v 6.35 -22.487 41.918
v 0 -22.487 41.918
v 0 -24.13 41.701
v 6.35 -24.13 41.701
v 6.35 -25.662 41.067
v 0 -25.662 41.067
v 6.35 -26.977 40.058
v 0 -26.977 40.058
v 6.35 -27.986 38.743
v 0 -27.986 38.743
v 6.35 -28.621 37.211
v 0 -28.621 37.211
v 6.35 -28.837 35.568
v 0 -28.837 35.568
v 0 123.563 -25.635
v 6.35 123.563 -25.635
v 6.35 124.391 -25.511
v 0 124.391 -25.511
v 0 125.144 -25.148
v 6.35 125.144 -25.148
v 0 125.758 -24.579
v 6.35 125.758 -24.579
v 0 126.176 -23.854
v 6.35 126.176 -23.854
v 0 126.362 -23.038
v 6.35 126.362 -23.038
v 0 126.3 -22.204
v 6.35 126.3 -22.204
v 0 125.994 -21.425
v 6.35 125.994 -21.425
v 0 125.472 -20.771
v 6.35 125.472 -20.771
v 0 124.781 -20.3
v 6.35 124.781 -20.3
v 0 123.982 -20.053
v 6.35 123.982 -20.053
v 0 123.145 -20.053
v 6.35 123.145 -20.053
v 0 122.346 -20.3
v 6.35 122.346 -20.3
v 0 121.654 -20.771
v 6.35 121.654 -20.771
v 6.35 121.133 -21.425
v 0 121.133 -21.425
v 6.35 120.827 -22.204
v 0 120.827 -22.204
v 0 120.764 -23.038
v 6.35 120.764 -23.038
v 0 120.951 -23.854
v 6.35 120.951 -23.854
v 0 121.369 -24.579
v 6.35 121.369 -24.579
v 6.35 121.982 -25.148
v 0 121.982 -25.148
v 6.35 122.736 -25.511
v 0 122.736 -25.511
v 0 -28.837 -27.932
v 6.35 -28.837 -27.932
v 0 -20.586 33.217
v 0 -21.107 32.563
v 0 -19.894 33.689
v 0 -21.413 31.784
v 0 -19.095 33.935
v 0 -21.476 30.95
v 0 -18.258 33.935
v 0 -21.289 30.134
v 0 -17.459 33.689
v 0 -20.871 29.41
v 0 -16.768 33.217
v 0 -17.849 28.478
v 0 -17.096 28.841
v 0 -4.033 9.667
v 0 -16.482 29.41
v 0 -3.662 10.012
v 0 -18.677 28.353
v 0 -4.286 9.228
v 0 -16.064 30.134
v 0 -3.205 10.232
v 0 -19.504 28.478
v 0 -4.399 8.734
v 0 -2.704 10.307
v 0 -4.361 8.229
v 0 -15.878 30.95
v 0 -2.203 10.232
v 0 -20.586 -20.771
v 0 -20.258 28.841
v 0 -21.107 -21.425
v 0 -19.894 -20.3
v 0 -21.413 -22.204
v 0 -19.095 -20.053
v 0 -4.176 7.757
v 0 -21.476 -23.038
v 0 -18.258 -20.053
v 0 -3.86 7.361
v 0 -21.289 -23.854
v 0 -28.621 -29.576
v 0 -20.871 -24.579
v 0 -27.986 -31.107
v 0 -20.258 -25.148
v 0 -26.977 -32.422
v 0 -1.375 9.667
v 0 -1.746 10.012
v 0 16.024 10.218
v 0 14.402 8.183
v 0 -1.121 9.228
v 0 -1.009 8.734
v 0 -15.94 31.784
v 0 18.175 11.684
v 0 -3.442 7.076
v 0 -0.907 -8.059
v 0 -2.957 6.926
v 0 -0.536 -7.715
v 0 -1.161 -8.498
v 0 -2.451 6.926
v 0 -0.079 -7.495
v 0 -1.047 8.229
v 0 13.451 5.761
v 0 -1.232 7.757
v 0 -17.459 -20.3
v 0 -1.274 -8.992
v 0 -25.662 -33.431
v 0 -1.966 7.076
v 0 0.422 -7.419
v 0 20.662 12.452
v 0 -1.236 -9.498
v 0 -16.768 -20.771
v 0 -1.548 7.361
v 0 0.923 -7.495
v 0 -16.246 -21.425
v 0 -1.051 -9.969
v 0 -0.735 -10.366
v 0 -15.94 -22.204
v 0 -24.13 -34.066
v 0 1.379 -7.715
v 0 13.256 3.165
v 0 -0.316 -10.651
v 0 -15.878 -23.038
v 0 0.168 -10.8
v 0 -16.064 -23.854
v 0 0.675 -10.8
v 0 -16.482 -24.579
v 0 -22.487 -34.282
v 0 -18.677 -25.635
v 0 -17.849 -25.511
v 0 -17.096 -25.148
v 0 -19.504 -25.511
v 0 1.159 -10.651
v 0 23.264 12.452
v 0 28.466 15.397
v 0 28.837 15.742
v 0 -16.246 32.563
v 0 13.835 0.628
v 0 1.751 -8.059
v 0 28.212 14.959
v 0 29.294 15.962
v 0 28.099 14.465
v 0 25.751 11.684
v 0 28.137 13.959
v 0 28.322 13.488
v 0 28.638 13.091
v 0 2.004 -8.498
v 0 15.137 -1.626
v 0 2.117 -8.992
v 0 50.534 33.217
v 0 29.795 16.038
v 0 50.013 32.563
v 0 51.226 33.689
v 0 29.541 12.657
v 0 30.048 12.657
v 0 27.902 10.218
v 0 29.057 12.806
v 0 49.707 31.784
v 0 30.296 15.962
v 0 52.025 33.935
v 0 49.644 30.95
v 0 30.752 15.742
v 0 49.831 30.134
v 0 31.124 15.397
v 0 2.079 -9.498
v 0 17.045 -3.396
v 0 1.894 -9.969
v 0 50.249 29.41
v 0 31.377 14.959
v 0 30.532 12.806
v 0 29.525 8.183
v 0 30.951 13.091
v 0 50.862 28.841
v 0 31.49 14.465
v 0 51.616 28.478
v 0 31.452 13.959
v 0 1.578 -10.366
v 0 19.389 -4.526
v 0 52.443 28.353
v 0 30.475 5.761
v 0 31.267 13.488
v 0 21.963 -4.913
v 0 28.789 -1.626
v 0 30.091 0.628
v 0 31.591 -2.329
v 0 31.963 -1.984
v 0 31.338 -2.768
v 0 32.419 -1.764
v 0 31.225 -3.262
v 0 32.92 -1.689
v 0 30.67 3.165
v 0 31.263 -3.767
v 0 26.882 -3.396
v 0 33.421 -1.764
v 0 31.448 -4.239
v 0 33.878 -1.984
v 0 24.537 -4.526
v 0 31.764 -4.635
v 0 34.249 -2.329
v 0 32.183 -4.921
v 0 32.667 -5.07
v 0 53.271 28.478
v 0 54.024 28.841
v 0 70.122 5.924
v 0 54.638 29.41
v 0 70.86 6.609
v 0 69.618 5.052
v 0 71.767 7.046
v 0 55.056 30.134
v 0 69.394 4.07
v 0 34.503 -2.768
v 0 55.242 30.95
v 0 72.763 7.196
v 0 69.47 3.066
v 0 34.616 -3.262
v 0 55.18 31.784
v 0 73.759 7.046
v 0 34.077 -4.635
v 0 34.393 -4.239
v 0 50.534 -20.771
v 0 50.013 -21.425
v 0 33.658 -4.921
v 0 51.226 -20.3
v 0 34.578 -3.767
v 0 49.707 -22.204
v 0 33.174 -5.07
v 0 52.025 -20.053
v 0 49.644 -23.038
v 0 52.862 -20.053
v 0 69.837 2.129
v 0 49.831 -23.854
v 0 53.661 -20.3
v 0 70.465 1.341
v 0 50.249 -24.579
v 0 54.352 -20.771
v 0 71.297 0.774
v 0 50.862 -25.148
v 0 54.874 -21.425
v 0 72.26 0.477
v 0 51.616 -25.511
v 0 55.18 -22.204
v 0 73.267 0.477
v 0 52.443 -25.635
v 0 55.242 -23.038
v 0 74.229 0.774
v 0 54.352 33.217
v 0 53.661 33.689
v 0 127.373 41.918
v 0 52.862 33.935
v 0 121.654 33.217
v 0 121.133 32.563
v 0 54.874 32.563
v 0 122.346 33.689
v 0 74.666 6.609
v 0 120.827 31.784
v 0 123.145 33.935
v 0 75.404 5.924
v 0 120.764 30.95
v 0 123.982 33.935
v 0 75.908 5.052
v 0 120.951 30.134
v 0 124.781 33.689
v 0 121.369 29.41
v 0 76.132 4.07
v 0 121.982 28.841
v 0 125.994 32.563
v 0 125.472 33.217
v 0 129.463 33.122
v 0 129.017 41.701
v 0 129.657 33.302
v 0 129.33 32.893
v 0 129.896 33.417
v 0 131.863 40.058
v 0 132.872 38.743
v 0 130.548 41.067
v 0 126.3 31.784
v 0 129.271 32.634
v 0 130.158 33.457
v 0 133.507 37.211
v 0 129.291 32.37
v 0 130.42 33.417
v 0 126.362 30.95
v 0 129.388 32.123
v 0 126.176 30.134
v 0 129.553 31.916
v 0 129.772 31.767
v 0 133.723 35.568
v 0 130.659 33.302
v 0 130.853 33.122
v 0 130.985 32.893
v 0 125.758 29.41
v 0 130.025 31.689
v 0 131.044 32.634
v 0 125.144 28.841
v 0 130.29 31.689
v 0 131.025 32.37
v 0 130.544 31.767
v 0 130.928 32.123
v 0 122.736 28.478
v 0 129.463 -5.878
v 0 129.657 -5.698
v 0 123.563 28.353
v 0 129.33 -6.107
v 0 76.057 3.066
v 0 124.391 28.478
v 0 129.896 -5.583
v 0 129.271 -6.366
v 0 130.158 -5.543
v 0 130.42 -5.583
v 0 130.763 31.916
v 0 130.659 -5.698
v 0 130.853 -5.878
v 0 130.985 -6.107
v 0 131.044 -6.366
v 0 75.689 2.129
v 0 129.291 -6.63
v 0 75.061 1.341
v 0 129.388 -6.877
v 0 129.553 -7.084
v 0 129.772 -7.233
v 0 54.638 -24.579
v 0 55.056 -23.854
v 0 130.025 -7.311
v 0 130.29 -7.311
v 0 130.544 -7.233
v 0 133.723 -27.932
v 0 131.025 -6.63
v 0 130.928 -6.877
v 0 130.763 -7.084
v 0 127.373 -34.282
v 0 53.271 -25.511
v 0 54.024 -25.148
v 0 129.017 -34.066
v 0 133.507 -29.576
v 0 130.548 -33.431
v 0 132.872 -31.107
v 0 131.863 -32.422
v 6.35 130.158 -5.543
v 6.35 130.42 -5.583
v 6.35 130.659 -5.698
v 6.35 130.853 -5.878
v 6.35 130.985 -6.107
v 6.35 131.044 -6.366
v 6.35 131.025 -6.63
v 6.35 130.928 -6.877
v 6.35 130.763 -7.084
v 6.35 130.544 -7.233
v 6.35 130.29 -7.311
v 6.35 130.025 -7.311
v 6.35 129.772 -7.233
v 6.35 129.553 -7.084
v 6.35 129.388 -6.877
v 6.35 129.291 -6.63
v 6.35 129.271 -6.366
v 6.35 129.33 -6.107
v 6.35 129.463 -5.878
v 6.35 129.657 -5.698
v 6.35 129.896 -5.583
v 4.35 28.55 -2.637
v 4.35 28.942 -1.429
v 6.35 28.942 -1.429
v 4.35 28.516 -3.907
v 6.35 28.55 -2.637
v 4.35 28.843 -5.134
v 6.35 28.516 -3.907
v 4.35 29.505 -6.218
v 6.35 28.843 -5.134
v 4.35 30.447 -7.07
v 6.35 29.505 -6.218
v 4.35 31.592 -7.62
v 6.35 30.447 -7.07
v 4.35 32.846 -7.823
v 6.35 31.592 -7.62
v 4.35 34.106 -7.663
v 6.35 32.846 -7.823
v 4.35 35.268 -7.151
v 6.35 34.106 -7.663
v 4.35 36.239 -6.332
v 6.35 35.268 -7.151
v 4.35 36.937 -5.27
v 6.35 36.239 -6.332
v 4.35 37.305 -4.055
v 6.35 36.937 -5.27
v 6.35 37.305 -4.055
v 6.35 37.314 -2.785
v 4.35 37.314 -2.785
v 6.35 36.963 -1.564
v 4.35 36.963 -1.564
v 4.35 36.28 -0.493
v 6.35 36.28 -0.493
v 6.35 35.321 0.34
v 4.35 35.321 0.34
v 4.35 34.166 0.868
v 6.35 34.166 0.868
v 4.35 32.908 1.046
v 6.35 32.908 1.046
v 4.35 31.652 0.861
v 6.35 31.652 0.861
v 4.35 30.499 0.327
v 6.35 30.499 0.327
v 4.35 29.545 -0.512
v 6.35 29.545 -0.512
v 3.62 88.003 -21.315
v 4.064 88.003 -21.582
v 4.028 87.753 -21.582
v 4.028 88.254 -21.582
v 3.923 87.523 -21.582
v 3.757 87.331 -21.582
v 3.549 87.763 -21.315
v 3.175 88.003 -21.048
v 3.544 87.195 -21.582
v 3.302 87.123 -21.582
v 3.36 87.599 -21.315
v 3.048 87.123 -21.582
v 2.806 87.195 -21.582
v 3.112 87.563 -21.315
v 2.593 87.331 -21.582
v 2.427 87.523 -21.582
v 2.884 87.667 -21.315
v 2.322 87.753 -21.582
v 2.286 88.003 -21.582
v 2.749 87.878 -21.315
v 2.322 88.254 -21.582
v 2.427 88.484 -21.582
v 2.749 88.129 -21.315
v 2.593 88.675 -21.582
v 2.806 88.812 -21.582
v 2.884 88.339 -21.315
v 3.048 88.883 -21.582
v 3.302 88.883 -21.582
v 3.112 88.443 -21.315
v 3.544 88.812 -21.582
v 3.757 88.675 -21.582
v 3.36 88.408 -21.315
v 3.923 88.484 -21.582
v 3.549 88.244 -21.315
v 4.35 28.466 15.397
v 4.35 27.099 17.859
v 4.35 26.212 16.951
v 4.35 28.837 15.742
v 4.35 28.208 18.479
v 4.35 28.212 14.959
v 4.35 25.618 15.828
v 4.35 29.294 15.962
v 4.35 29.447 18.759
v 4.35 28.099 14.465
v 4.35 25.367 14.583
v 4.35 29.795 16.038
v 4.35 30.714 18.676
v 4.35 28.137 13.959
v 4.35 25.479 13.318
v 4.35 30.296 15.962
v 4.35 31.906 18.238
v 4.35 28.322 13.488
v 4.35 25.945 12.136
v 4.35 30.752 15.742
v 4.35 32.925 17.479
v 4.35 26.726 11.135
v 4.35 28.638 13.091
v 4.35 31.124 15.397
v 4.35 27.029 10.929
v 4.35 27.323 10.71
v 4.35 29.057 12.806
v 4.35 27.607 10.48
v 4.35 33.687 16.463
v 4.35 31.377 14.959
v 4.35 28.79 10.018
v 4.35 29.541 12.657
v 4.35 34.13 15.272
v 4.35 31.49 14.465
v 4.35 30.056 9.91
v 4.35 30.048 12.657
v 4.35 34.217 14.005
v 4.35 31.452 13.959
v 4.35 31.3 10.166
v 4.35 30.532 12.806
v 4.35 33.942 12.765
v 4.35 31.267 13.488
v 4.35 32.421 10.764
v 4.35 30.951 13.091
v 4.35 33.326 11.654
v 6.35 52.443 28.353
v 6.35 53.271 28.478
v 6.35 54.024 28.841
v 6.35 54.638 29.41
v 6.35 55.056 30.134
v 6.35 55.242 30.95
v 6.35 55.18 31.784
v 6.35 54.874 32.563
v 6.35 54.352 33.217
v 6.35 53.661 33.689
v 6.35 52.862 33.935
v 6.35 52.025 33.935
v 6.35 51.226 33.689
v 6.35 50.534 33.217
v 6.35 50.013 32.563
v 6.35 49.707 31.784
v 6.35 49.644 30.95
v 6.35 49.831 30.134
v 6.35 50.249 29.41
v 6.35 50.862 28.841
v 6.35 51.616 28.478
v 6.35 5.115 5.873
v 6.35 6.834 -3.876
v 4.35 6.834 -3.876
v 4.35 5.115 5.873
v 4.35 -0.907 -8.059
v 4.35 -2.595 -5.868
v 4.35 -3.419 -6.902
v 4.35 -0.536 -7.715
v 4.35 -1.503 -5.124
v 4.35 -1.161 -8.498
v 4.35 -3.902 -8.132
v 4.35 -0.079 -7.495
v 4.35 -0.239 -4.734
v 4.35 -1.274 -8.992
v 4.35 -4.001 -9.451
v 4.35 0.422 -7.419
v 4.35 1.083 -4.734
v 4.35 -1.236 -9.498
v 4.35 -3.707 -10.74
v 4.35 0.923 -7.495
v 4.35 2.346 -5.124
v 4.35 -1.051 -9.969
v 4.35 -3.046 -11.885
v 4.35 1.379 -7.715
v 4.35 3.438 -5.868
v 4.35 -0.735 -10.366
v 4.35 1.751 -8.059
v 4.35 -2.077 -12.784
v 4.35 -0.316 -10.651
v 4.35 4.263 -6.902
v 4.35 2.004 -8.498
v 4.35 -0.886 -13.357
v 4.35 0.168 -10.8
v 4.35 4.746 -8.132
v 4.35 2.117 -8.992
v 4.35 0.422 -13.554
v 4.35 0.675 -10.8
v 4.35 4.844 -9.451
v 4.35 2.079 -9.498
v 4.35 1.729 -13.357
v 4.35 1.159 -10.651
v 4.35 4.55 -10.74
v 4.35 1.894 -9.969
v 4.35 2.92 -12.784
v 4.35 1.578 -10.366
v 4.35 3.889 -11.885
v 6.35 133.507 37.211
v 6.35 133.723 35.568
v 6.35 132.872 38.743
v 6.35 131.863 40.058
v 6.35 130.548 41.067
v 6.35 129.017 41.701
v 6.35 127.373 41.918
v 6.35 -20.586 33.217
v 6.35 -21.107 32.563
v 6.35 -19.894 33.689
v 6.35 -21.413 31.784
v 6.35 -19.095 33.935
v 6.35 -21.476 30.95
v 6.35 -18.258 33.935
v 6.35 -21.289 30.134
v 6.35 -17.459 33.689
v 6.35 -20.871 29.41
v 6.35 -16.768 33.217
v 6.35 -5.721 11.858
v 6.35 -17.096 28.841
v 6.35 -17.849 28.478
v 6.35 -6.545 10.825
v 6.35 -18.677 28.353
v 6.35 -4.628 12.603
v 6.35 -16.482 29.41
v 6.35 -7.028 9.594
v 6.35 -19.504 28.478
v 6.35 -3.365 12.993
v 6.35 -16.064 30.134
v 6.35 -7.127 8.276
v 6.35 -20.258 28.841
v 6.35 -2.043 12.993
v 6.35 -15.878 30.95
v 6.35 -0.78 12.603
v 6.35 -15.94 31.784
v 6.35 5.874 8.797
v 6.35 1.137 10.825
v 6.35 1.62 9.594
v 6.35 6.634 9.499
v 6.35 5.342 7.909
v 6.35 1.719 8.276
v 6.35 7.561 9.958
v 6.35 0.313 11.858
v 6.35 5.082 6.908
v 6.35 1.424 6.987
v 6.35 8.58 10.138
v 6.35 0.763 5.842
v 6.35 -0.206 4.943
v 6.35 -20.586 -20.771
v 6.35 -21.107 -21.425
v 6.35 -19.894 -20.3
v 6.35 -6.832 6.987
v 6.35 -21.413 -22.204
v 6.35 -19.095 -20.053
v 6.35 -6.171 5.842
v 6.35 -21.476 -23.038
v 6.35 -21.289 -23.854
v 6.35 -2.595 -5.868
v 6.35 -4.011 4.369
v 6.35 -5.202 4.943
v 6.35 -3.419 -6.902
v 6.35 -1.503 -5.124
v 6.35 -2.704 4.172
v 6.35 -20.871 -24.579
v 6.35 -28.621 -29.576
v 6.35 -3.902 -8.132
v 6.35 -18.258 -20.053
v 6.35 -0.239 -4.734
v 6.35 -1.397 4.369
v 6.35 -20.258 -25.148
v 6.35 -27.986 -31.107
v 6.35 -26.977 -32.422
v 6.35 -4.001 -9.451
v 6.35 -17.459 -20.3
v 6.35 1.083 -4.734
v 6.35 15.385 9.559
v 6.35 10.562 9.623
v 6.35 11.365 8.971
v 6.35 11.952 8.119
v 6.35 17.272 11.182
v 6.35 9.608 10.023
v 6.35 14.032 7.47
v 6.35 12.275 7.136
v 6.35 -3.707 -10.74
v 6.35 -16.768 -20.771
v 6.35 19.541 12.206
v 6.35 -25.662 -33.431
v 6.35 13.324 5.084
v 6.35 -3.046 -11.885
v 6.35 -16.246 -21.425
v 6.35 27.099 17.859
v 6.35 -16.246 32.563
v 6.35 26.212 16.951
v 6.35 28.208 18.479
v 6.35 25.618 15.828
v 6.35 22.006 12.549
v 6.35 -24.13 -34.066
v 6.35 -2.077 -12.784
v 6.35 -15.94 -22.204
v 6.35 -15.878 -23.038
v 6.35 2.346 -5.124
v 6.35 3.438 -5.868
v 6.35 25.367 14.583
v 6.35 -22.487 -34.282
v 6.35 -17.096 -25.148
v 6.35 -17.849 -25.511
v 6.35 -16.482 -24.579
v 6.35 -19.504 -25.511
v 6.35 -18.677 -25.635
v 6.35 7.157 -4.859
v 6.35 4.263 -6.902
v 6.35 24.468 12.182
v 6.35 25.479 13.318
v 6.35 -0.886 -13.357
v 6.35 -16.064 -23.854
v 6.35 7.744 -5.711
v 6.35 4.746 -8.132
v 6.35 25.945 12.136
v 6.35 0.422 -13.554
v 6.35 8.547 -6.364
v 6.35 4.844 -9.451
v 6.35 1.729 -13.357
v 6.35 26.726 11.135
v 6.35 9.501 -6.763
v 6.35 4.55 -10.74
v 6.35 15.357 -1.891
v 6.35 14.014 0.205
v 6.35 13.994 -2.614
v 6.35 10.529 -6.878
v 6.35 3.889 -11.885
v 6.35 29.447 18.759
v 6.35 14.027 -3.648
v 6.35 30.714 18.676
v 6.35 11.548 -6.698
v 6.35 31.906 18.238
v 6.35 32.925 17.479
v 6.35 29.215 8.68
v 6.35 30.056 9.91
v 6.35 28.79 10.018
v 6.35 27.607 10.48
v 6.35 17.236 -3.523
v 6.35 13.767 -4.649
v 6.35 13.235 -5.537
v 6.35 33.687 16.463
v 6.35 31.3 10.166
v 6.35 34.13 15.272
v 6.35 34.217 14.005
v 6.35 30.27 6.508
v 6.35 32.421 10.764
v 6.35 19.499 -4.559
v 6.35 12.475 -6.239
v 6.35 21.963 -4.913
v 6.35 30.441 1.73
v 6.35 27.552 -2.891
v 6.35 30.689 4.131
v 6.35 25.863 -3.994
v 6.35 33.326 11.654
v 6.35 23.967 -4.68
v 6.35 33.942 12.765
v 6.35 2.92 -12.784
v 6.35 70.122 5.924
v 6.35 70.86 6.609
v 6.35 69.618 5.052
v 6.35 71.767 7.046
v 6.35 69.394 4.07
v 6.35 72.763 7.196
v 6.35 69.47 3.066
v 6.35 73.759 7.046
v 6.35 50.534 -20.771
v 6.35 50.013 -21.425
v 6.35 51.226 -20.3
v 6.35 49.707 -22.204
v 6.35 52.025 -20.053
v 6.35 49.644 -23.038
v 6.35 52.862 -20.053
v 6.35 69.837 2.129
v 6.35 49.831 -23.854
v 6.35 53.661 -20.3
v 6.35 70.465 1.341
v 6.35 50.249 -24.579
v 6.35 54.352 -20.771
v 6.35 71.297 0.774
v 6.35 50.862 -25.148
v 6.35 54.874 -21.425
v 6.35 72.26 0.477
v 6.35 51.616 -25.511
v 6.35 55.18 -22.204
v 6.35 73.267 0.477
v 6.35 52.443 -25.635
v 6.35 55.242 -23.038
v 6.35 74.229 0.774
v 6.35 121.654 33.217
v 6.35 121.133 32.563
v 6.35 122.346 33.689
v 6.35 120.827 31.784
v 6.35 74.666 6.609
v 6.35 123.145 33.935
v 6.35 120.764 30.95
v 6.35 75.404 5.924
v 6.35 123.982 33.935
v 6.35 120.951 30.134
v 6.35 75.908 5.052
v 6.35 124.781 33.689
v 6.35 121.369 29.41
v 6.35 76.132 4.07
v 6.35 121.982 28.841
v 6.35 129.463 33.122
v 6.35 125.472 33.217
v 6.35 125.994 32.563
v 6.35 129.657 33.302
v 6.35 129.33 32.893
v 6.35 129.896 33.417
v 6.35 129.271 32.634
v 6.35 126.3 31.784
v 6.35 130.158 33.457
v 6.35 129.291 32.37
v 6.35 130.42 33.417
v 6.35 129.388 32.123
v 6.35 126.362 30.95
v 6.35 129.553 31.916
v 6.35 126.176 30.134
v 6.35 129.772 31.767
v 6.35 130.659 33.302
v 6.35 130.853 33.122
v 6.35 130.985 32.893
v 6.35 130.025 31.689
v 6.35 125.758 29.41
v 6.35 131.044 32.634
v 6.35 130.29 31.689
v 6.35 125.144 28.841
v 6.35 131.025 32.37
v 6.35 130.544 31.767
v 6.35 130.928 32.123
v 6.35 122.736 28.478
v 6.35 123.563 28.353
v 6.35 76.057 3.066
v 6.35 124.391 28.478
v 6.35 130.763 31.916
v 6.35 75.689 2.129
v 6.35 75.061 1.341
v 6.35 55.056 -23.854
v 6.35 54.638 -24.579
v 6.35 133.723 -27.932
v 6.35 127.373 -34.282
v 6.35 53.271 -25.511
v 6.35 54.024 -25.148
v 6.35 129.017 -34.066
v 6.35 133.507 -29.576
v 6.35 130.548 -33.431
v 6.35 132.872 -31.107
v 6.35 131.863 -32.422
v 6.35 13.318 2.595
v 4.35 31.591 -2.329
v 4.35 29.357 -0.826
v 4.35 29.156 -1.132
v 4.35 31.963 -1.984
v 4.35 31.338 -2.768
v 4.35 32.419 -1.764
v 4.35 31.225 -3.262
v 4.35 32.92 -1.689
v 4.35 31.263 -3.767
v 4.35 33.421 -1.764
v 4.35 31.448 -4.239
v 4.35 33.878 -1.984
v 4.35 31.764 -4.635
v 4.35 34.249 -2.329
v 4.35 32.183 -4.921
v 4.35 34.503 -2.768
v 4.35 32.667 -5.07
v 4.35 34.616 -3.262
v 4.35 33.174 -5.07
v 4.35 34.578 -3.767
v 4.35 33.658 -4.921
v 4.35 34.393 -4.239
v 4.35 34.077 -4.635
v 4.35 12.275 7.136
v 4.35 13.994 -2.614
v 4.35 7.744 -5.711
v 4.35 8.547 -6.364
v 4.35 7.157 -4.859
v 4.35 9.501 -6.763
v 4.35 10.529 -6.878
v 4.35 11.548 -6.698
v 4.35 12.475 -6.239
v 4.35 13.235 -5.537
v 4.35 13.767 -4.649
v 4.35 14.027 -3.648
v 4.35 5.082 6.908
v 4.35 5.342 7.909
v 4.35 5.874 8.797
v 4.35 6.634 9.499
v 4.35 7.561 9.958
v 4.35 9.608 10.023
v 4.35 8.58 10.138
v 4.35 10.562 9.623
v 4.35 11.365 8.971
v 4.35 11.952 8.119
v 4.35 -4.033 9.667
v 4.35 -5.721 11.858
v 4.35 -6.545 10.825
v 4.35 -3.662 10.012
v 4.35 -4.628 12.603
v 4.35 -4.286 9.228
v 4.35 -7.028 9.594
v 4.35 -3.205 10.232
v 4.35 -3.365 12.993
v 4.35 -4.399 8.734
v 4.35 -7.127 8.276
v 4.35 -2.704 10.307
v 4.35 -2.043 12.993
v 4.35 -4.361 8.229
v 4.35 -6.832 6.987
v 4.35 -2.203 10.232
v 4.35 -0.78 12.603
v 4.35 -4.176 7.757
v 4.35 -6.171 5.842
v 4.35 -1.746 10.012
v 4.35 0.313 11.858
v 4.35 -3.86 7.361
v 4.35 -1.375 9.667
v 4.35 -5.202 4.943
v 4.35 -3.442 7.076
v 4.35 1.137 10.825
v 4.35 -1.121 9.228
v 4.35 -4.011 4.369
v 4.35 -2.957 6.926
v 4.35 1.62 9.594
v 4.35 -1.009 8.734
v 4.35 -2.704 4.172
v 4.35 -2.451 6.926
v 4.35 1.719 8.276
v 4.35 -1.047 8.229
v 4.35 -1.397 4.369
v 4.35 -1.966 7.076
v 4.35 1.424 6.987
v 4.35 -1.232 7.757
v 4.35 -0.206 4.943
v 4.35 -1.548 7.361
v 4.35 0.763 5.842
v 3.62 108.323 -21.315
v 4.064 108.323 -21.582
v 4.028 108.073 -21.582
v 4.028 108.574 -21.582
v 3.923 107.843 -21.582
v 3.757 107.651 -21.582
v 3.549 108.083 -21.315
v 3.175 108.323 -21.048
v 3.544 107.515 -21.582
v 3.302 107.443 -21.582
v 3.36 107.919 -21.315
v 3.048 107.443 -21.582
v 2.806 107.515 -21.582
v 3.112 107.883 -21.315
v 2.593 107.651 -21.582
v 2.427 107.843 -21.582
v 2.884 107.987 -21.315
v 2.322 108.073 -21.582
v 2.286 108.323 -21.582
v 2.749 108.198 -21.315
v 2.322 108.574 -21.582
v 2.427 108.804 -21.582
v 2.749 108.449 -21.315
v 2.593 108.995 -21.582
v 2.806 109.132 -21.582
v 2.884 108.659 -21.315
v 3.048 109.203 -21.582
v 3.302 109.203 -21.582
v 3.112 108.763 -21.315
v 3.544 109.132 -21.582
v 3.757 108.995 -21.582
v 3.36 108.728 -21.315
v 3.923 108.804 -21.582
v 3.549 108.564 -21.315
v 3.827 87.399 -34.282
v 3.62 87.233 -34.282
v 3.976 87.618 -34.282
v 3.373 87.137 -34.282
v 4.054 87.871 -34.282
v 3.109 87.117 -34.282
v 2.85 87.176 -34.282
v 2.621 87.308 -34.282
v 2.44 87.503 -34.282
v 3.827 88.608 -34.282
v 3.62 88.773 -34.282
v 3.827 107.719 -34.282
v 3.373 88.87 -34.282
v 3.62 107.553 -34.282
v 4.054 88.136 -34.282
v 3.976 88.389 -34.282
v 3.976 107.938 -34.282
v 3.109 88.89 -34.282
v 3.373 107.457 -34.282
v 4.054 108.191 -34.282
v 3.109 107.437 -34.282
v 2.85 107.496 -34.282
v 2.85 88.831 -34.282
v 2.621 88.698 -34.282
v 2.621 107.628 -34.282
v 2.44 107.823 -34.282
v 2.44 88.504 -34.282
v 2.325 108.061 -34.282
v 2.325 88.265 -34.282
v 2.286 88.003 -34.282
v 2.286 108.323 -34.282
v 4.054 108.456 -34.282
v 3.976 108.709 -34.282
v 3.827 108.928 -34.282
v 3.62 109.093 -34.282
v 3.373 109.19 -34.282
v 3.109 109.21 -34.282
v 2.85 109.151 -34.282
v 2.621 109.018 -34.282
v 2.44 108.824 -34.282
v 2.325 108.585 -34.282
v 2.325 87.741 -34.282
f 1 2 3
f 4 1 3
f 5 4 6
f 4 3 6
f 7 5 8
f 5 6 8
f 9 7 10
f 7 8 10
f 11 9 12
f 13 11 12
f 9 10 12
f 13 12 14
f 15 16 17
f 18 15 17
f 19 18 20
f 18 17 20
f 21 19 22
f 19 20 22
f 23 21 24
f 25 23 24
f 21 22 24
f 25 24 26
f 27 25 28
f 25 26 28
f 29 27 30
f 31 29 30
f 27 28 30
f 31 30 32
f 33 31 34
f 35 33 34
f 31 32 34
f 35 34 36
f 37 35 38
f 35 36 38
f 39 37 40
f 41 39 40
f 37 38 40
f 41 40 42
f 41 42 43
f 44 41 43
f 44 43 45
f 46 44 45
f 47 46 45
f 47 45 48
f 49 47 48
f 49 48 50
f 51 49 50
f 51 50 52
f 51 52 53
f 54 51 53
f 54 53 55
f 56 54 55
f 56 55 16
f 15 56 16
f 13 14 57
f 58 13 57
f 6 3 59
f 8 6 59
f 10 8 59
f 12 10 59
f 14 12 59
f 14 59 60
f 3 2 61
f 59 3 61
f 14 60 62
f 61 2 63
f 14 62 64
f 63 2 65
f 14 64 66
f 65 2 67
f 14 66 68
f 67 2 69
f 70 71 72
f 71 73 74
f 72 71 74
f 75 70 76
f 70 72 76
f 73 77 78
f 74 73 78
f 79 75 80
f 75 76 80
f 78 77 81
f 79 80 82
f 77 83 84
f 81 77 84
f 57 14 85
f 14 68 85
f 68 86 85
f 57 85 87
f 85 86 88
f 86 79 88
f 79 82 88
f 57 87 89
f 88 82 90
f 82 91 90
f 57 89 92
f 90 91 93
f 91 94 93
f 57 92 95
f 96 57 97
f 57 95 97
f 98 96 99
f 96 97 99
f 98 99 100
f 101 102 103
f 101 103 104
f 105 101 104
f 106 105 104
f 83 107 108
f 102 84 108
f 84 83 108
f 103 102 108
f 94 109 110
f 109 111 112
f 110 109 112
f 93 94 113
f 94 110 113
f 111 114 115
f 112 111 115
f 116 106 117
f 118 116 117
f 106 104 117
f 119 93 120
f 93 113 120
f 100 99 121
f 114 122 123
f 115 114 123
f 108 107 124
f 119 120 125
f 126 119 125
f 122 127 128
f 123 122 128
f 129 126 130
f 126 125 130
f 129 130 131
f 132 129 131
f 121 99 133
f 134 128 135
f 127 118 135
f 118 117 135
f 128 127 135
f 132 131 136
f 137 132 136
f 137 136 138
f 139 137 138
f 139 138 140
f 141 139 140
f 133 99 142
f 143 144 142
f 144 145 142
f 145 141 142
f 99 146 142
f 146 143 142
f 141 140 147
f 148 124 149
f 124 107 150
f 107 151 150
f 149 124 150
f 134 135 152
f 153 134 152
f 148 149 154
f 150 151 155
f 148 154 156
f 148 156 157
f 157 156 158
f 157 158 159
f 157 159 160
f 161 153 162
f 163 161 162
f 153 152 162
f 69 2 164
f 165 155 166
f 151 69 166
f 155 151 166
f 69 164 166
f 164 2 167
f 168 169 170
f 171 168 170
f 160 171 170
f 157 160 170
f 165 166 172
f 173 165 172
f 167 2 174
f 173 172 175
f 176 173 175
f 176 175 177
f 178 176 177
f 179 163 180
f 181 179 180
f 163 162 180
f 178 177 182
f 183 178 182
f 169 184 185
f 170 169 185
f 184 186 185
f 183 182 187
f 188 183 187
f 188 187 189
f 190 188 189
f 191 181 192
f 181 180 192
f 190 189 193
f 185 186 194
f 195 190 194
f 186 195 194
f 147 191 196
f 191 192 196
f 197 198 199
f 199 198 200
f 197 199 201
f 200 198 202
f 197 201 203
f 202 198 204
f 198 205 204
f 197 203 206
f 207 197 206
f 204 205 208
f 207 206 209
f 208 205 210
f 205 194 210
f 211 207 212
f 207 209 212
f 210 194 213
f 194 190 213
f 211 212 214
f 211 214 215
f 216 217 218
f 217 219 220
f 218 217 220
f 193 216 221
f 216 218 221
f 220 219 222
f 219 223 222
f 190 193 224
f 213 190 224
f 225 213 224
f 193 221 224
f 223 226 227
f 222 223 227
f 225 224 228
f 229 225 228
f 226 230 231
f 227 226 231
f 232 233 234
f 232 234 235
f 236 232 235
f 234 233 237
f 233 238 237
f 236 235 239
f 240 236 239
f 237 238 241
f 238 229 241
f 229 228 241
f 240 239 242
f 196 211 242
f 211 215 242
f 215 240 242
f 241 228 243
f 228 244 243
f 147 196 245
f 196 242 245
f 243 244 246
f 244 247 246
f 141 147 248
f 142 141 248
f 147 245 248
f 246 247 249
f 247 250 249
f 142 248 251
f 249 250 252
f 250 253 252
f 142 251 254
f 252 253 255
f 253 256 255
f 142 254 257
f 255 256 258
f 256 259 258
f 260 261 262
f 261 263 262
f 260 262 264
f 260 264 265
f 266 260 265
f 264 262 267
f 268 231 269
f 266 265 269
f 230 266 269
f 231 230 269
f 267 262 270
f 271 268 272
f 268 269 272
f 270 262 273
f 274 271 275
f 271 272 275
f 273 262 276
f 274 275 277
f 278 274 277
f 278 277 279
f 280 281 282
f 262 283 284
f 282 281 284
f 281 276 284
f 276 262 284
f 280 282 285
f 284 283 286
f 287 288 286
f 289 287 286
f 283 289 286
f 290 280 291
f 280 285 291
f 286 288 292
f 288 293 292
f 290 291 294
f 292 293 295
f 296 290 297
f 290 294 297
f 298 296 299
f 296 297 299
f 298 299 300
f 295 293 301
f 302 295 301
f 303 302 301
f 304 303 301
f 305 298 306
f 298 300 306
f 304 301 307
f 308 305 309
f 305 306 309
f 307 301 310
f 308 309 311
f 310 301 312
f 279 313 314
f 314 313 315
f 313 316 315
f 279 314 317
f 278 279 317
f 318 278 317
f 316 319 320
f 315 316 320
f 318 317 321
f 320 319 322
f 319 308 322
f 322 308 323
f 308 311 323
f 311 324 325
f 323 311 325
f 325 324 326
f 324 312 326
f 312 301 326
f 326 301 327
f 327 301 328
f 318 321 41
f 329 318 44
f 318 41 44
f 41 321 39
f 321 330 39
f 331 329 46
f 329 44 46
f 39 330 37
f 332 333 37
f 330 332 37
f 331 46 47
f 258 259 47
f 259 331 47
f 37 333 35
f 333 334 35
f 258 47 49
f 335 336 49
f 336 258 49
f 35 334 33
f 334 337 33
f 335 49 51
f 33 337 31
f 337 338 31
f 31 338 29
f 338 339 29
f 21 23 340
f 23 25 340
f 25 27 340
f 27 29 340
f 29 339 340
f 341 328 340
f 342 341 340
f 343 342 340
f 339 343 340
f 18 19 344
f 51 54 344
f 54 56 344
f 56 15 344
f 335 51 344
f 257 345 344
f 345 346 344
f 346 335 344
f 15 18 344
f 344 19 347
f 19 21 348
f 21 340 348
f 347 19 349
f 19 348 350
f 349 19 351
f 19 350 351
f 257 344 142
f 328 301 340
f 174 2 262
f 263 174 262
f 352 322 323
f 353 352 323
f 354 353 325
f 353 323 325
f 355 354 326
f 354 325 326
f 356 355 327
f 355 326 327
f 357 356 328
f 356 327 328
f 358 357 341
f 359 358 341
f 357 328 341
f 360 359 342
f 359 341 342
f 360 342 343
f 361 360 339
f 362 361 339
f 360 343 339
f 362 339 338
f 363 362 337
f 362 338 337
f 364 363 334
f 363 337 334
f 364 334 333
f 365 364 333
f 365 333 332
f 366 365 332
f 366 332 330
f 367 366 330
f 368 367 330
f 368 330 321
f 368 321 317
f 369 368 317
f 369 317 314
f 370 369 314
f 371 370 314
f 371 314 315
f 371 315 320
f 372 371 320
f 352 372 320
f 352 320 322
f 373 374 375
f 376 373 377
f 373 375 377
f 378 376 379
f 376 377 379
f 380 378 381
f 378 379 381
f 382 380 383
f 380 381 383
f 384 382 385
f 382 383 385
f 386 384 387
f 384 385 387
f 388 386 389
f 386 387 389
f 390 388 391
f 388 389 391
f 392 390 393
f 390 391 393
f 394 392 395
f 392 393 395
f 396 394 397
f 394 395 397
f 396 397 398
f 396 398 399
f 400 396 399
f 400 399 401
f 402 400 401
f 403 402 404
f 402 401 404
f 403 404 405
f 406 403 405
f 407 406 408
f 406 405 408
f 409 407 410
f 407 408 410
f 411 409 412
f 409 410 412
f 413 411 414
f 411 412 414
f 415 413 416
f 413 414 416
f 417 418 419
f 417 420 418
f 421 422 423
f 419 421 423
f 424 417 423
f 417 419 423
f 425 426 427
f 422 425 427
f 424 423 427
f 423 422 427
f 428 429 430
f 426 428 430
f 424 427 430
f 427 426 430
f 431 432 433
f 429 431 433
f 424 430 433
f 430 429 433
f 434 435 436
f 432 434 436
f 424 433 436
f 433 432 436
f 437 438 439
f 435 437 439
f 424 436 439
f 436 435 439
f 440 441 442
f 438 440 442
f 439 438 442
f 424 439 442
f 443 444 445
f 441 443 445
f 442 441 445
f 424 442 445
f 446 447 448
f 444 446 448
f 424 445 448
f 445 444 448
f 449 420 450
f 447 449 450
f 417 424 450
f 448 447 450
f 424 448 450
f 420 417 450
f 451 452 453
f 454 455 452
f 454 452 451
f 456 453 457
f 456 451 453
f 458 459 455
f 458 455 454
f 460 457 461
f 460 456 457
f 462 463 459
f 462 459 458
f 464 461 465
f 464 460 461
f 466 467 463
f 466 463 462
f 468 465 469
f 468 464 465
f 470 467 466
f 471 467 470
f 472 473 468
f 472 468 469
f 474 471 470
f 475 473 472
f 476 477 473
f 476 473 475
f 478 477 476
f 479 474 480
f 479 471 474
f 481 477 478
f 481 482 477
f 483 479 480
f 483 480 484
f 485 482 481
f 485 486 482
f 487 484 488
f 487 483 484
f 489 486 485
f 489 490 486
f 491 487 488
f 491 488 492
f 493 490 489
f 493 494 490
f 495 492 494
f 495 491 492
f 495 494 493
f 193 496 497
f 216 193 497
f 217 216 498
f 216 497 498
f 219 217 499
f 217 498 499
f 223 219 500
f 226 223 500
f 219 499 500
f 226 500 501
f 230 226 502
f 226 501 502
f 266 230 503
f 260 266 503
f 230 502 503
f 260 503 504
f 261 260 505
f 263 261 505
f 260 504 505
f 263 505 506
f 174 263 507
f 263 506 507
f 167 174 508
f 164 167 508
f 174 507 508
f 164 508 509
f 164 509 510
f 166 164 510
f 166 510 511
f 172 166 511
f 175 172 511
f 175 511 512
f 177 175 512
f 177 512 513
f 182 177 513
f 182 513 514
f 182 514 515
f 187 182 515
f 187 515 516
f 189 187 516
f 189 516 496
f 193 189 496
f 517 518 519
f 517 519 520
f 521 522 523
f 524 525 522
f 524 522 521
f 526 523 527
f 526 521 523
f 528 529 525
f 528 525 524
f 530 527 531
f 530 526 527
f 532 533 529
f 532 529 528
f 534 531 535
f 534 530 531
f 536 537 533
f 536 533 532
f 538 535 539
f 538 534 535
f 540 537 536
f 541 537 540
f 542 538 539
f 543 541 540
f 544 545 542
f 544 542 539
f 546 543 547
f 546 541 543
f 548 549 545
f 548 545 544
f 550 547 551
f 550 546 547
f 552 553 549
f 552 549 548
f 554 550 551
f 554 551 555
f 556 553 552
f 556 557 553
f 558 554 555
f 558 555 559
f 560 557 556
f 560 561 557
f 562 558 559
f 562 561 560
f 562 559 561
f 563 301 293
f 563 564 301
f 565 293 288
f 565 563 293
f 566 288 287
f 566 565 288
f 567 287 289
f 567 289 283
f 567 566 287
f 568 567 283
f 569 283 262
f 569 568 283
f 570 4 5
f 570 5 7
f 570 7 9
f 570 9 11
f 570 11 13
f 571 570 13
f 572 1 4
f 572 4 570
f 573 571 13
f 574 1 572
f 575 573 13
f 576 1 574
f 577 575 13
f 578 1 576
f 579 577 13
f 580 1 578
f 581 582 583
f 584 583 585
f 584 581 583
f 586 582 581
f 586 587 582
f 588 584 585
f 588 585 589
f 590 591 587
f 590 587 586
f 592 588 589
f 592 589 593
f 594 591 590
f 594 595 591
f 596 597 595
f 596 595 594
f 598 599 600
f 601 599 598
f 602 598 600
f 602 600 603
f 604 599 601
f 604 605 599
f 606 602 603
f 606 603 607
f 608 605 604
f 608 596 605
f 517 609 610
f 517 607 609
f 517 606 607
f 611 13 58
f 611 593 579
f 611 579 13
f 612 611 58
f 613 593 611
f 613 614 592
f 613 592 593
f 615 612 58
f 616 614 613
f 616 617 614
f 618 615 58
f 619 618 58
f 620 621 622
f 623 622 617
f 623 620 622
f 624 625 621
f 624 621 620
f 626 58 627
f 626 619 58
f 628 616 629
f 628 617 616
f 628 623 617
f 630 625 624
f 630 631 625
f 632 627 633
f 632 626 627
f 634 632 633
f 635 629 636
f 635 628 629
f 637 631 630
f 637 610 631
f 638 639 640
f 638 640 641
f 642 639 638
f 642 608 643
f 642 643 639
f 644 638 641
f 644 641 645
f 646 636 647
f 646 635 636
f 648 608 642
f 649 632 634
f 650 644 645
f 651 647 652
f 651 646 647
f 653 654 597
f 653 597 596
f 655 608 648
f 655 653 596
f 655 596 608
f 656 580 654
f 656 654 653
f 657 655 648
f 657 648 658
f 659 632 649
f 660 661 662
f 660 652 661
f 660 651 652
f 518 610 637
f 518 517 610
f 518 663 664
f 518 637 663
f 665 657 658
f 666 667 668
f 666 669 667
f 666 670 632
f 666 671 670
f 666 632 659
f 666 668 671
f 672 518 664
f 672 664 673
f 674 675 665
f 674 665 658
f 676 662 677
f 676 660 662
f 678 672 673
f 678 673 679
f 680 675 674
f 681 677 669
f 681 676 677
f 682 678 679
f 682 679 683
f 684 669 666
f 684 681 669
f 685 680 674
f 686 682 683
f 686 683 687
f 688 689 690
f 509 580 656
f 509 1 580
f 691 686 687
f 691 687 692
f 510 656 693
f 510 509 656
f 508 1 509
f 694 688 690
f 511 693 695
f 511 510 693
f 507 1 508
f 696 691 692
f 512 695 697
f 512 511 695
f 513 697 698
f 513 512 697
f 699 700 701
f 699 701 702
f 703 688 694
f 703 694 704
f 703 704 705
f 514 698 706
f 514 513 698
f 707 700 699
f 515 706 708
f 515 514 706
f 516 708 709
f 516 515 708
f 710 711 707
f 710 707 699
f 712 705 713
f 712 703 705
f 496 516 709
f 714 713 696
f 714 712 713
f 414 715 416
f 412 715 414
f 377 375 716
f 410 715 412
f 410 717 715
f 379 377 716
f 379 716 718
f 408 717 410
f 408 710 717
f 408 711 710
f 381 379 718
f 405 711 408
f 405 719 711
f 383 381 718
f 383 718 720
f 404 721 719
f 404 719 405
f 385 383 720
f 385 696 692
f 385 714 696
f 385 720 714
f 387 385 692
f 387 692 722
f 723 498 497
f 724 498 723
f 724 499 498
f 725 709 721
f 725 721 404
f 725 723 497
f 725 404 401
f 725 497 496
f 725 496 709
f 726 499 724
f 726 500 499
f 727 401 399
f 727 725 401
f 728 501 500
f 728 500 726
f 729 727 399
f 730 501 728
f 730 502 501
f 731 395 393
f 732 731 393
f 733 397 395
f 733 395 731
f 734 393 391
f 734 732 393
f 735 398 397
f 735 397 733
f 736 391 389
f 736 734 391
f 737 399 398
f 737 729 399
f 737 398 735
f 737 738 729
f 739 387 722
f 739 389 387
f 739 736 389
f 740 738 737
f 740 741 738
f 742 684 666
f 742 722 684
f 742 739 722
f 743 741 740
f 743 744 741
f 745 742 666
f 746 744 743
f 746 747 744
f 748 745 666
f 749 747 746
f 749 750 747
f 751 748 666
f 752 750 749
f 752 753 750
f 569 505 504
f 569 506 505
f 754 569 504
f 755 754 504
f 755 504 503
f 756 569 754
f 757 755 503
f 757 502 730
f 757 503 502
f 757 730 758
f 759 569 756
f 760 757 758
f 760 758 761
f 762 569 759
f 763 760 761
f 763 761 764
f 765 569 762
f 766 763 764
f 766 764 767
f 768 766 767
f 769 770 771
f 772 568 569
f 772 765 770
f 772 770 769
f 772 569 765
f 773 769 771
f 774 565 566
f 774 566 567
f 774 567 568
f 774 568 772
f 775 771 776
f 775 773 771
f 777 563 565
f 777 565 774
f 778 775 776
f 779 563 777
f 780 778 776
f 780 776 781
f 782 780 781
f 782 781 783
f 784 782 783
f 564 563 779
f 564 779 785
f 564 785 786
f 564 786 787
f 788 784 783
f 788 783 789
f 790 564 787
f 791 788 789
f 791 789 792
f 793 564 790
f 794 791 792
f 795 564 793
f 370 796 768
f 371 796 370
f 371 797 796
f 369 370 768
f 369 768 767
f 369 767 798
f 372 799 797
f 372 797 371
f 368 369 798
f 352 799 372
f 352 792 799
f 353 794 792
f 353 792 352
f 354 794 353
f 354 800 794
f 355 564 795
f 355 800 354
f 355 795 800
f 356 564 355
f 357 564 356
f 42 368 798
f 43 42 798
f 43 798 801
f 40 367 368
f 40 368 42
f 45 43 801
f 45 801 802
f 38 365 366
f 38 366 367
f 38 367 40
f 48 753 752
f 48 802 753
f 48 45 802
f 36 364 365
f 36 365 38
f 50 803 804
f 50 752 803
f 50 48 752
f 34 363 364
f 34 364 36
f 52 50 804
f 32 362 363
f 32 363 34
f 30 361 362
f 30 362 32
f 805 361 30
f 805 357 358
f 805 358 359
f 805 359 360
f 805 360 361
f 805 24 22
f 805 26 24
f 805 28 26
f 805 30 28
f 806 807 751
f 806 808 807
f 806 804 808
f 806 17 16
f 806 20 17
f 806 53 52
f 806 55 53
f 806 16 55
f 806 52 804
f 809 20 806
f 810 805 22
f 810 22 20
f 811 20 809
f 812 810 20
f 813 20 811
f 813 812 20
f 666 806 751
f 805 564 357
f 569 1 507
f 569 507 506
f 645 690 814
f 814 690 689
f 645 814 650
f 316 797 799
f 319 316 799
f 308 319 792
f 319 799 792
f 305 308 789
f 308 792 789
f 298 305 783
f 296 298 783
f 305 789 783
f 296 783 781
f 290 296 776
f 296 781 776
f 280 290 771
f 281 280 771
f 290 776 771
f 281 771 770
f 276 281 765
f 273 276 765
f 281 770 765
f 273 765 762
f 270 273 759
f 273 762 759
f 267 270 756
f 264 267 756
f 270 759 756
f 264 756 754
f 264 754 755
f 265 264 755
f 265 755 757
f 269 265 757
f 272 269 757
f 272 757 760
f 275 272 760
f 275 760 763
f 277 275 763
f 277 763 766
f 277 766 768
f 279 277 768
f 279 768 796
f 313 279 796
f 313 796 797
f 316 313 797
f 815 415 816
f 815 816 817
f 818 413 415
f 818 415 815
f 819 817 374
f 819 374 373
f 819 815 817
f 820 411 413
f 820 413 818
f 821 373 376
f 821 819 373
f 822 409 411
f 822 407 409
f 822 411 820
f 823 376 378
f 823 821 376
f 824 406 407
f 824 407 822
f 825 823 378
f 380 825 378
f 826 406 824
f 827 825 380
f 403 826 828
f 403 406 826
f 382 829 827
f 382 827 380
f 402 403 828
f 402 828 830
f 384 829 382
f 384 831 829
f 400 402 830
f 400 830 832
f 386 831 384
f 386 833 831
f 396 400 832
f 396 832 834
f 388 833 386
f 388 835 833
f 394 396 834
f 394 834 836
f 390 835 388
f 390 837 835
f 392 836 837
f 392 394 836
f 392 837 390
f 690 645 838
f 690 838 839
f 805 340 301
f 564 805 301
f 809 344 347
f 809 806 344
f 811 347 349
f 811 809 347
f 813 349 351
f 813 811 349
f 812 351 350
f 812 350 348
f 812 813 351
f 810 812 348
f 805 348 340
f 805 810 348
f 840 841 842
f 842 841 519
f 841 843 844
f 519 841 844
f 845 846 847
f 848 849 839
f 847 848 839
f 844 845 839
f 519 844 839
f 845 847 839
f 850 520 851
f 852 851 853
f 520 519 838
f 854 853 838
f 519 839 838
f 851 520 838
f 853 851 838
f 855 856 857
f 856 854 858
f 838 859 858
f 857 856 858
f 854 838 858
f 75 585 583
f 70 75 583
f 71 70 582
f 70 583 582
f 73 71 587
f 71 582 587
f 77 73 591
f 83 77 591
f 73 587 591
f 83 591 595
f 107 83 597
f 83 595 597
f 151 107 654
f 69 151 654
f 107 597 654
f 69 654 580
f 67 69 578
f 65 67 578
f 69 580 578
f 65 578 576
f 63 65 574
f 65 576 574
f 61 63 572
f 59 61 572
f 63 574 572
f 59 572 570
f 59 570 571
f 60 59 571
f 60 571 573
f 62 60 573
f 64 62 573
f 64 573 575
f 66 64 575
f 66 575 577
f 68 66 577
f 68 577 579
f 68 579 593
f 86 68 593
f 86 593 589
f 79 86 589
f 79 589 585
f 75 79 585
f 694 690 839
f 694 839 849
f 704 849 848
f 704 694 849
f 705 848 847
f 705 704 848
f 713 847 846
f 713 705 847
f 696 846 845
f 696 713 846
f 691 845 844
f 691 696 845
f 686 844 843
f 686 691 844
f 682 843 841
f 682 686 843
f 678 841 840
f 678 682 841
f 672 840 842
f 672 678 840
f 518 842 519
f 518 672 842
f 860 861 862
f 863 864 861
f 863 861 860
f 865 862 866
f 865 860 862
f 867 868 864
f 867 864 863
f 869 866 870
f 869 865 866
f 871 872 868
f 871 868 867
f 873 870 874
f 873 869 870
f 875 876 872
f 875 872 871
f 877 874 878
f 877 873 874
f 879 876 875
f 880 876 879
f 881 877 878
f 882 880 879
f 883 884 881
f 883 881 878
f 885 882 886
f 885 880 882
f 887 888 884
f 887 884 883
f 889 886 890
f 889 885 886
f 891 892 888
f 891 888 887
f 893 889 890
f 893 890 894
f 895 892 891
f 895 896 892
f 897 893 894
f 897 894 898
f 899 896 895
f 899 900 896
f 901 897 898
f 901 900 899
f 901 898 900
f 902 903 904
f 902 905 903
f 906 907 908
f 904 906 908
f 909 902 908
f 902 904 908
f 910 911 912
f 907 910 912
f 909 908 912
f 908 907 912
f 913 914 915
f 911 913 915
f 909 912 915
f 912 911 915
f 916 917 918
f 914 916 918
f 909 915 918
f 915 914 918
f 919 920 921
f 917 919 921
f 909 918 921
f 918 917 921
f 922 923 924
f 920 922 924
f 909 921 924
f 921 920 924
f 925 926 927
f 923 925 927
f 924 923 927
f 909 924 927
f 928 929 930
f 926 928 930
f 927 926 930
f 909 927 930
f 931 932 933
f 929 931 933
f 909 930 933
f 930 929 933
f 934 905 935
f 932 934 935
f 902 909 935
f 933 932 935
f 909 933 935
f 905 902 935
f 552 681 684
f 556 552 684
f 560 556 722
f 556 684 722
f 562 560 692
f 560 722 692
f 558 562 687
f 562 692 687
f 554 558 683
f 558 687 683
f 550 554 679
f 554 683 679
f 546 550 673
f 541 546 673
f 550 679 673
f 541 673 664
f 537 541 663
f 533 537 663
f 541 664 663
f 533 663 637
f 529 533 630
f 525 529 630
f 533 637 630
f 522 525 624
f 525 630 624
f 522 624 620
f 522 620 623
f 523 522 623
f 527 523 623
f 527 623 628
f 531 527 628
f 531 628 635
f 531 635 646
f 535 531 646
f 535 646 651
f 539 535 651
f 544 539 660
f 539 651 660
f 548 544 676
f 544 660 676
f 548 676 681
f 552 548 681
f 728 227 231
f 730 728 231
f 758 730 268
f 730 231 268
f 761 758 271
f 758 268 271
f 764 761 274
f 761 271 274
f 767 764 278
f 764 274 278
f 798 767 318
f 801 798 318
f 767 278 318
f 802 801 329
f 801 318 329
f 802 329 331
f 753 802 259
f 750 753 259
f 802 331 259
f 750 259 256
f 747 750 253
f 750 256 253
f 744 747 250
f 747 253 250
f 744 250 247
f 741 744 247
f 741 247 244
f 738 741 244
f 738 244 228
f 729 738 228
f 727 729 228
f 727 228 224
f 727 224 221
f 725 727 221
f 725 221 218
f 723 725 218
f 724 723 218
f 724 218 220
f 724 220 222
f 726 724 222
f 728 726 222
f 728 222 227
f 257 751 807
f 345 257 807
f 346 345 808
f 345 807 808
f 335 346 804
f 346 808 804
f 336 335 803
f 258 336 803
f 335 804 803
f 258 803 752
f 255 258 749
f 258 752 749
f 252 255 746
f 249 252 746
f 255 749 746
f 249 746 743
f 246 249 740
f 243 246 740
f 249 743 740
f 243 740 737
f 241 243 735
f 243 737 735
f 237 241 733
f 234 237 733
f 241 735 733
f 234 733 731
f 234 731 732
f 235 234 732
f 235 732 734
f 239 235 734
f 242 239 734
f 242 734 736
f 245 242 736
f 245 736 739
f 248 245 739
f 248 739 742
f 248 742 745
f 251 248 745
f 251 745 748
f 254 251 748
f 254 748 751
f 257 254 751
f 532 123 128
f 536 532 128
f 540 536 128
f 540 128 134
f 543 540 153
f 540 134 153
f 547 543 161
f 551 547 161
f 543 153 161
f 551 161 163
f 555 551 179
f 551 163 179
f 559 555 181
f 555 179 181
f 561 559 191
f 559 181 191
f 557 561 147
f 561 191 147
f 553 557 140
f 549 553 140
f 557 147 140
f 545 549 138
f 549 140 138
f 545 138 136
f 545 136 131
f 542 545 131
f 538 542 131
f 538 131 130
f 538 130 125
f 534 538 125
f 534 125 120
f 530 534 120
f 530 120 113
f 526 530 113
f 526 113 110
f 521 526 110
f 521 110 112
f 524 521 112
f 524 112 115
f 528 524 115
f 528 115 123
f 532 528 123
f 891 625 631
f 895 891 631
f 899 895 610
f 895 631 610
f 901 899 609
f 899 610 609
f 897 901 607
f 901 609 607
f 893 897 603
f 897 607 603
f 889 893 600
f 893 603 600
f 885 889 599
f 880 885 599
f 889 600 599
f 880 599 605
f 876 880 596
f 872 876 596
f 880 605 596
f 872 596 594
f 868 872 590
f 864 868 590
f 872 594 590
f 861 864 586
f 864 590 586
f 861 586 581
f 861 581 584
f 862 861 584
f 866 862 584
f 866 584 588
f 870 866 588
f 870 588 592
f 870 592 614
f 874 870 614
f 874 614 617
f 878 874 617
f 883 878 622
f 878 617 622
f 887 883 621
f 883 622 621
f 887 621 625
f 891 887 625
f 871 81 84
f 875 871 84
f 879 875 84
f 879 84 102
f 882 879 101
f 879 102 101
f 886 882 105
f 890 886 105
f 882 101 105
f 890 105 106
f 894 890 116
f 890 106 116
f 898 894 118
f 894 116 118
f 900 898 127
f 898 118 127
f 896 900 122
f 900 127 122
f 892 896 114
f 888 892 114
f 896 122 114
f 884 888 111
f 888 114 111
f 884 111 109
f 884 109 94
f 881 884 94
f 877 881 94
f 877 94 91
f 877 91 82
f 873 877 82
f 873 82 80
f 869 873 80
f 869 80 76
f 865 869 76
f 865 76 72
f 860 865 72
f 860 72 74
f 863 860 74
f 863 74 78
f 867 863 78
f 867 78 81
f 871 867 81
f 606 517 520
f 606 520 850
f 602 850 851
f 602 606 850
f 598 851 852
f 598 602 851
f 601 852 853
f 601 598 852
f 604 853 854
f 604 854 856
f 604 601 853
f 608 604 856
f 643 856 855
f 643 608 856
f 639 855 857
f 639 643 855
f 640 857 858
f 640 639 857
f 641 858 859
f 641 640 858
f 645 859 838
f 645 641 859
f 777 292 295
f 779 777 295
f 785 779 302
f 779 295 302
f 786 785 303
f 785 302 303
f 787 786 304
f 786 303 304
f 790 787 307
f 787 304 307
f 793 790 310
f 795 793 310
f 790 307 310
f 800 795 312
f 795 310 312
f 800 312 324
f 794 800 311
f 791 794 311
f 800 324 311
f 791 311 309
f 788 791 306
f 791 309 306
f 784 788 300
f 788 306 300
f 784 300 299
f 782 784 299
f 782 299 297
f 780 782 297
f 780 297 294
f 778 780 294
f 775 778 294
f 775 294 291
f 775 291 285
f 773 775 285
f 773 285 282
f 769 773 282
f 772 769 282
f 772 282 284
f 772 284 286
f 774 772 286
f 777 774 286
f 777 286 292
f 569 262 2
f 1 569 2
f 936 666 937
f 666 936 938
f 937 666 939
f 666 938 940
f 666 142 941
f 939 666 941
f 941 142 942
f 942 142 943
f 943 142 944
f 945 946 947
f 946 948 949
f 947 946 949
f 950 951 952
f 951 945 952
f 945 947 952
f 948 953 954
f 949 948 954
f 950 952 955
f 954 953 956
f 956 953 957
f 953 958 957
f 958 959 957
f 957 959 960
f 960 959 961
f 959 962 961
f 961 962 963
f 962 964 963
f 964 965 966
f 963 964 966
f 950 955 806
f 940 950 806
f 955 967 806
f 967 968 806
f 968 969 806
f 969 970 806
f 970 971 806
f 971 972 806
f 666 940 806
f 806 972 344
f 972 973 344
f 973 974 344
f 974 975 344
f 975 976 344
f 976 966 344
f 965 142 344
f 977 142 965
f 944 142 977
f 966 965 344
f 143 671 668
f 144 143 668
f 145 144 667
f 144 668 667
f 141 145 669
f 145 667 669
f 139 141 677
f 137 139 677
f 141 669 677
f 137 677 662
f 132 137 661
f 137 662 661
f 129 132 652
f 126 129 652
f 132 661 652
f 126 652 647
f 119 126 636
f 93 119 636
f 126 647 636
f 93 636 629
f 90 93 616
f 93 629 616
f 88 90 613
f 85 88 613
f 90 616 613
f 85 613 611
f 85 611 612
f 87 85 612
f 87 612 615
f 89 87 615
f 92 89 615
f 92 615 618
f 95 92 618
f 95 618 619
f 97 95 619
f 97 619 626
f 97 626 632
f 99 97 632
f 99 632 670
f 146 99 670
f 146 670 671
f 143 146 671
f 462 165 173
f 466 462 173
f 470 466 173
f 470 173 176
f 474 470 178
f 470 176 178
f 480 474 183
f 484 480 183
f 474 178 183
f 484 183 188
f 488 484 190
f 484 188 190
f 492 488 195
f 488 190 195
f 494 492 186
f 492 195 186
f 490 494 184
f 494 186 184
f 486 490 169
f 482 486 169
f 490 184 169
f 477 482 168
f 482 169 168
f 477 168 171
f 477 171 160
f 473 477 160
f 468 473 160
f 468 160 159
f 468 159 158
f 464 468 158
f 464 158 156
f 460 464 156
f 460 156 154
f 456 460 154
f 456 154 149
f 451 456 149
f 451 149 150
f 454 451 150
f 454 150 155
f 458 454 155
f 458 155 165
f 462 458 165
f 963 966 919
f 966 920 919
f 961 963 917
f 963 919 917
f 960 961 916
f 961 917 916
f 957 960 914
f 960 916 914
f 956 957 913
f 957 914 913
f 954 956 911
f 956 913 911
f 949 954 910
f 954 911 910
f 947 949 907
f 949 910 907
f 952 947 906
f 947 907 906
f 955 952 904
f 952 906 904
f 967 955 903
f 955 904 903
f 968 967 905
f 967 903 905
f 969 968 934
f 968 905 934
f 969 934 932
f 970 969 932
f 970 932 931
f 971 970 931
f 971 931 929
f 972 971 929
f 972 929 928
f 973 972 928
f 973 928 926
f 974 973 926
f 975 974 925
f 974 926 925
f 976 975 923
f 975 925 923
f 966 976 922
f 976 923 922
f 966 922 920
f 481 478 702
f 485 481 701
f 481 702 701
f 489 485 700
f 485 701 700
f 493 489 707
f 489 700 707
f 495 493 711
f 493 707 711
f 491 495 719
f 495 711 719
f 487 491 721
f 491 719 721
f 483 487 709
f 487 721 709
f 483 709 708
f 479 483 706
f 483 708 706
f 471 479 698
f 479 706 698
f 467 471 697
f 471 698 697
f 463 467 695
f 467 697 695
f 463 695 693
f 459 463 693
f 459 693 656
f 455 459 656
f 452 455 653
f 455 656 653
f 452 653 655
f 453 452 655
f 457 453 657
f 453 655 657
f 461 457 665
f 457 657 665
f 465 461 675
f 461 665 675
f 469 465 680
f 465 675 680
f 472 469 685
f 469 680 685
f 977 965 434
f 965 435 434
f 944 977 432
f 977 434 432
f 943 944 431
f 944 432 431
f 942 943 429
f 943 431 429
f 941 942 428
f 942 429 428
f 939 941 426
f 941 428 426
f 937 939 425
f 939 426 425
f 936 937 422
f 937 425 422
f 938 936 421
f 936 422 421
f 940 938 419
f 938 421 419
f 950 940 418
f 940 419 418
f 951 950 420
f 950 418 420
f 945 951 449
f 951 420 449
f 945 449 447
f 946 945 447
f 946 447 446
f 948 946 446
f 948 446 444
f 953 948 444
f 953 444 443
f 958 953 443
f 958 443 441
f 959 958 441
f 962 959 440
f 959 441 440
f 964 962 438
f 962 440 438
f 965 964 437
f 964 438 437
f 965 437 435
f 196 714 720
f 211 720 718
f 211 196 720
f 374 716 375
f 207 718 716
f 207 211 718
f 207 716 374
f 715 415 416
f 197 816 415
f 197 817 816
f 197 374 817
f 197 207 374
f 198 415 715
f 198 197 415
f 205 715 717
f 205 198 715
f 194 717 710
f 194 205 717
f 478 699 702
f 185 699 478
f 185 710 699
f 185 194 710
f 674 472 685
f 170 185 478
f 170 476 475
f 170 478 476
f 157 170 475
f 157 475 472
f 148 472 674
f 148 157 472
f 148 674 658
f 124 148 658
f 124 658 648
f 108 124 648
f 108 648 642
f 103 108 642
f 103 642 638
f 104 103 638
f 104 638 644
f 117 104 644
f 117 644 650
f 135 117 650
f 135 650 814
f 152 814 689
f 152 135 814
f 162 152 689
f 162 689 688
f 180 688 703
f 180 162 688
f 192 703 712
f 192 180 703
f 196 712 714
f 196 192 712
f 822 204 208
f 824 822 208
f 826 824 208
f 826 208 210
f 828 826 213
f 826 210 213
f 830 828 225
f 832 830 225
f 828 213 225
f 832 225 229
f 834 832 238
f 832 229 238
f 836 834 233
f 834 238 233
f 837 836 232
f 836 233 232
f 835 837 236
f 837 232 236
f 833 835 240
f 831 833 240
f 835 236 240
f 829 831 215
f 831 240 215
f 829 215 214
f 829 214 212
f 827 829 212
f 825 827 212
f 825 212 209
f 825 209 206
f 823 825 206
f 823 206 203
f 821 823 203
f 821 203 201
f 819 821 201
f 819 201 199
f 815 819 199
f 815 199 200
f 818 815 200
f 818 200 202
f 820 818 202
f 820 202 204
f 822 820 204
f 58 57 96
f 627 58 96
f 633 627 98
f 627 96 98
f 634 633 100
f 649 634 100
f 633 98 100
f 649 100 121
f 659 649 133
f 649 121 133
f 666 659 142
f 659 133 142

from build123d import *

# Parameters (mm, degrees)
SKETCH1_R                      = 8.73125
BOSS_EXTRUDE1_DEPTH            = 6.35
SKETCH7_R                      = 7.235
SKETCH7_R_2                    = 4.435
CUT_EXTRUDE2_DEPTH             = 2.000000064
M3_CLEARANCE_HOLE2_D           = 3.4
F_2_0_221_DIAMETER_HOLE1_D     = 5.6134
F_2_0_221_DIAMETER_HOLE1_DEPTH = 6.35
F_1_4_CLEARANCE_HOLE2_D        = 6.7564
TAP_DRILL_FOR_2_56_TAP2_D      = 1.778
TAP_DRILL_FOR_2_56_TAP2_DEPTH  = 12.7
TAP_DRILL_FOR_2_56_TAP2_TIP    = 0.53416509
FILLET1_R                      = 6.35
TAP_DRILL_FOR_2_56_TAP1_D      = 1.778


with BuildPart() as part:
    # Sketch1 → Boss-Extrude1 (new body)
    with BuildSketch(Plane(origin=(0, 0, 0), x_dir=(0, 0, -1), z_dir=(1, 0, 0))):
        with BuildLine():
            Line((34.282198326, -22.486920134), (34.282198326, 133.723079866))
            Line((34.282198326, 133.723079866), (-41.917801674, 133.723079866))
            Line((-41.917801674, 133.723079866), (-41.917801674, -22.486920134))
            ThreePointArc((-41.917801674, -22.486920134), (-40.057929734, -26.977048194), (-35.567801674, -28.836920134))
            Line((-35.567801674, -28.836920134), (27.932198326, -28.836920134))
            ThreePointArc((27.932198326, -28.836920134), (32.422326387, -26.977048194), (34.282198326, -22.486920134))
        make_face()
        with Locations((-3.817801674, 21.963079866)):
            Circle(SKETCH1_R, mode=Mode.SUBTRACT)
    extrude(amount=BOSS_EXTRUDE1_DEPTH)

    # Sketch7 → Cut-Extrude2 (cut)
    with BuildSketch(Plane(origin=(6.35, 0, 0), x_dir=(0, 0, -1), z_dir=(1, 0, 0))):
        with Locations((-3.817801674, 21.963079866)):
            Circle(SKETCH7_R)
        with Locations((3.388972242, 32.920368331)):
            Circle(SKETCH7_R_2)
        with Locations((-14.337567313, 29.794701133)):
            Circle(SKETCH7_R_2)
        with Locations((9.119362105, 0.421712482)):
            Circle(SKETCH7_R_2)
        with Locations((-8.60717745, -2.703954716)):
            Circle(SKETCH7_R_2)
        with BuildLine():
            Line((-7.135844138, 12.274719881), (2.613752617, 13.99383684))
            ThreePointArc((2.613752617, 13.99383684), (6.824739925, 11.045271784), (3.876174868, 6.834284476))
            Line((3.876174868, 6.834284476), (-5.873421887, 5.115167517))
            ThreePointArc((-5.873421887, 5.115167517), (-10.084409195, 8.063732573), (-7.135844138, 12.274719881))
        make_face()
    extrude(amount=-CUT_EXTRUDE2_DEPTH, mode=Mode.SUBTRACT)

    # M3 Clearance Hole2 (through all)
    with Locations(Plane(origin=(6.35, 0, 0), x_dir=(0, 0, -1), z_dir=(1, 0, 0))):
        with Locations((9.119362105, 0.421712482), (-8.60717745, -2.703954716), (-14.337567313, 29.794701133), (3.388972242, 32.920368331)):
            Hole(M3_CLEARANCE_HOLE2_D / 2)

    # #2 (0.221) Diameter Hole1
    with Locations(Plane.ZY):
        with Locations((-22.828731326, 123.563340866), (31.159813674, 123.563340866), (31.159813674, 52.443340866), (-22.828731326, 52.443340866), (-22.828731326, -18.676659134), (31.159813674, -18.676659134)):
            Hole(F_2_0_221_DIAMETER_HOLE1_D / 2, depth=F_2_0_221_DIAMETER_HOLE1_DEPTH)

    # 1/4 Clearance Hole2 (through all)
    with Locations(Plane(origin=(6.35, 0, 0), x_dir=(0, 0, -1), z_dir=(1, 0, 0))):
        with Locations((-3.817801674, 72.763079866)):
            Hole(F_1_4_CLEARANCE_HOLE2_D / 2)

    # Tap Drill for #2-56 Tap2
    with Locations(Plane(origin=(0, 167.140830498, -34.282198326), x_dir=(1, 0, 0), z_dir=(0, 0, -1))):
        with Locations((3.175, 58.817489631), (3.175, 79.137489631)):
            Hole(TAP_DRILL_FOR_2_56_TAP2_D / 2, depth=TAP_DRILL_FOR_2_56_TAP2_DEPTH)
            with Locations((0, 0, -(TAP_DRILL_FOR_2_56_TAP2_DEPTH + TAP_DRILL_FOR_2_56_TAP2_TIP / 2))):  # 118° drill point
                Cone(0, TAP_DRILL_FOR_2_56_TAP2_D / 2, TAP_DRILL_FOR_2_56_TAP2_TIP, mode=Mode.SUBTRACT)

    # Fillet1
    fillet1_edges = [part.edges().sort_by_distance(p)[0] for p in [
        (3.175, 133.723079866, 41.917801674),
        (3.175, 133.723079866, -34.282198326),
    ]]
    fillet(fillet1_edges, radius=FILLET1_R)

    # Tap Drill for #2-56 Tap1 (through all)
    with Locations(Plane(origin=(6.35, 0, 0), x_dir=(0, 0, -1), z_dir=(1, 0, 0))):
        with Locations((6.432198326, 130.157875406), (-32.567801674, 130.157875406)):
            Hole(TAP_DRILL_FOR_2_56_TAP1_D / 2)


solid = part.part
